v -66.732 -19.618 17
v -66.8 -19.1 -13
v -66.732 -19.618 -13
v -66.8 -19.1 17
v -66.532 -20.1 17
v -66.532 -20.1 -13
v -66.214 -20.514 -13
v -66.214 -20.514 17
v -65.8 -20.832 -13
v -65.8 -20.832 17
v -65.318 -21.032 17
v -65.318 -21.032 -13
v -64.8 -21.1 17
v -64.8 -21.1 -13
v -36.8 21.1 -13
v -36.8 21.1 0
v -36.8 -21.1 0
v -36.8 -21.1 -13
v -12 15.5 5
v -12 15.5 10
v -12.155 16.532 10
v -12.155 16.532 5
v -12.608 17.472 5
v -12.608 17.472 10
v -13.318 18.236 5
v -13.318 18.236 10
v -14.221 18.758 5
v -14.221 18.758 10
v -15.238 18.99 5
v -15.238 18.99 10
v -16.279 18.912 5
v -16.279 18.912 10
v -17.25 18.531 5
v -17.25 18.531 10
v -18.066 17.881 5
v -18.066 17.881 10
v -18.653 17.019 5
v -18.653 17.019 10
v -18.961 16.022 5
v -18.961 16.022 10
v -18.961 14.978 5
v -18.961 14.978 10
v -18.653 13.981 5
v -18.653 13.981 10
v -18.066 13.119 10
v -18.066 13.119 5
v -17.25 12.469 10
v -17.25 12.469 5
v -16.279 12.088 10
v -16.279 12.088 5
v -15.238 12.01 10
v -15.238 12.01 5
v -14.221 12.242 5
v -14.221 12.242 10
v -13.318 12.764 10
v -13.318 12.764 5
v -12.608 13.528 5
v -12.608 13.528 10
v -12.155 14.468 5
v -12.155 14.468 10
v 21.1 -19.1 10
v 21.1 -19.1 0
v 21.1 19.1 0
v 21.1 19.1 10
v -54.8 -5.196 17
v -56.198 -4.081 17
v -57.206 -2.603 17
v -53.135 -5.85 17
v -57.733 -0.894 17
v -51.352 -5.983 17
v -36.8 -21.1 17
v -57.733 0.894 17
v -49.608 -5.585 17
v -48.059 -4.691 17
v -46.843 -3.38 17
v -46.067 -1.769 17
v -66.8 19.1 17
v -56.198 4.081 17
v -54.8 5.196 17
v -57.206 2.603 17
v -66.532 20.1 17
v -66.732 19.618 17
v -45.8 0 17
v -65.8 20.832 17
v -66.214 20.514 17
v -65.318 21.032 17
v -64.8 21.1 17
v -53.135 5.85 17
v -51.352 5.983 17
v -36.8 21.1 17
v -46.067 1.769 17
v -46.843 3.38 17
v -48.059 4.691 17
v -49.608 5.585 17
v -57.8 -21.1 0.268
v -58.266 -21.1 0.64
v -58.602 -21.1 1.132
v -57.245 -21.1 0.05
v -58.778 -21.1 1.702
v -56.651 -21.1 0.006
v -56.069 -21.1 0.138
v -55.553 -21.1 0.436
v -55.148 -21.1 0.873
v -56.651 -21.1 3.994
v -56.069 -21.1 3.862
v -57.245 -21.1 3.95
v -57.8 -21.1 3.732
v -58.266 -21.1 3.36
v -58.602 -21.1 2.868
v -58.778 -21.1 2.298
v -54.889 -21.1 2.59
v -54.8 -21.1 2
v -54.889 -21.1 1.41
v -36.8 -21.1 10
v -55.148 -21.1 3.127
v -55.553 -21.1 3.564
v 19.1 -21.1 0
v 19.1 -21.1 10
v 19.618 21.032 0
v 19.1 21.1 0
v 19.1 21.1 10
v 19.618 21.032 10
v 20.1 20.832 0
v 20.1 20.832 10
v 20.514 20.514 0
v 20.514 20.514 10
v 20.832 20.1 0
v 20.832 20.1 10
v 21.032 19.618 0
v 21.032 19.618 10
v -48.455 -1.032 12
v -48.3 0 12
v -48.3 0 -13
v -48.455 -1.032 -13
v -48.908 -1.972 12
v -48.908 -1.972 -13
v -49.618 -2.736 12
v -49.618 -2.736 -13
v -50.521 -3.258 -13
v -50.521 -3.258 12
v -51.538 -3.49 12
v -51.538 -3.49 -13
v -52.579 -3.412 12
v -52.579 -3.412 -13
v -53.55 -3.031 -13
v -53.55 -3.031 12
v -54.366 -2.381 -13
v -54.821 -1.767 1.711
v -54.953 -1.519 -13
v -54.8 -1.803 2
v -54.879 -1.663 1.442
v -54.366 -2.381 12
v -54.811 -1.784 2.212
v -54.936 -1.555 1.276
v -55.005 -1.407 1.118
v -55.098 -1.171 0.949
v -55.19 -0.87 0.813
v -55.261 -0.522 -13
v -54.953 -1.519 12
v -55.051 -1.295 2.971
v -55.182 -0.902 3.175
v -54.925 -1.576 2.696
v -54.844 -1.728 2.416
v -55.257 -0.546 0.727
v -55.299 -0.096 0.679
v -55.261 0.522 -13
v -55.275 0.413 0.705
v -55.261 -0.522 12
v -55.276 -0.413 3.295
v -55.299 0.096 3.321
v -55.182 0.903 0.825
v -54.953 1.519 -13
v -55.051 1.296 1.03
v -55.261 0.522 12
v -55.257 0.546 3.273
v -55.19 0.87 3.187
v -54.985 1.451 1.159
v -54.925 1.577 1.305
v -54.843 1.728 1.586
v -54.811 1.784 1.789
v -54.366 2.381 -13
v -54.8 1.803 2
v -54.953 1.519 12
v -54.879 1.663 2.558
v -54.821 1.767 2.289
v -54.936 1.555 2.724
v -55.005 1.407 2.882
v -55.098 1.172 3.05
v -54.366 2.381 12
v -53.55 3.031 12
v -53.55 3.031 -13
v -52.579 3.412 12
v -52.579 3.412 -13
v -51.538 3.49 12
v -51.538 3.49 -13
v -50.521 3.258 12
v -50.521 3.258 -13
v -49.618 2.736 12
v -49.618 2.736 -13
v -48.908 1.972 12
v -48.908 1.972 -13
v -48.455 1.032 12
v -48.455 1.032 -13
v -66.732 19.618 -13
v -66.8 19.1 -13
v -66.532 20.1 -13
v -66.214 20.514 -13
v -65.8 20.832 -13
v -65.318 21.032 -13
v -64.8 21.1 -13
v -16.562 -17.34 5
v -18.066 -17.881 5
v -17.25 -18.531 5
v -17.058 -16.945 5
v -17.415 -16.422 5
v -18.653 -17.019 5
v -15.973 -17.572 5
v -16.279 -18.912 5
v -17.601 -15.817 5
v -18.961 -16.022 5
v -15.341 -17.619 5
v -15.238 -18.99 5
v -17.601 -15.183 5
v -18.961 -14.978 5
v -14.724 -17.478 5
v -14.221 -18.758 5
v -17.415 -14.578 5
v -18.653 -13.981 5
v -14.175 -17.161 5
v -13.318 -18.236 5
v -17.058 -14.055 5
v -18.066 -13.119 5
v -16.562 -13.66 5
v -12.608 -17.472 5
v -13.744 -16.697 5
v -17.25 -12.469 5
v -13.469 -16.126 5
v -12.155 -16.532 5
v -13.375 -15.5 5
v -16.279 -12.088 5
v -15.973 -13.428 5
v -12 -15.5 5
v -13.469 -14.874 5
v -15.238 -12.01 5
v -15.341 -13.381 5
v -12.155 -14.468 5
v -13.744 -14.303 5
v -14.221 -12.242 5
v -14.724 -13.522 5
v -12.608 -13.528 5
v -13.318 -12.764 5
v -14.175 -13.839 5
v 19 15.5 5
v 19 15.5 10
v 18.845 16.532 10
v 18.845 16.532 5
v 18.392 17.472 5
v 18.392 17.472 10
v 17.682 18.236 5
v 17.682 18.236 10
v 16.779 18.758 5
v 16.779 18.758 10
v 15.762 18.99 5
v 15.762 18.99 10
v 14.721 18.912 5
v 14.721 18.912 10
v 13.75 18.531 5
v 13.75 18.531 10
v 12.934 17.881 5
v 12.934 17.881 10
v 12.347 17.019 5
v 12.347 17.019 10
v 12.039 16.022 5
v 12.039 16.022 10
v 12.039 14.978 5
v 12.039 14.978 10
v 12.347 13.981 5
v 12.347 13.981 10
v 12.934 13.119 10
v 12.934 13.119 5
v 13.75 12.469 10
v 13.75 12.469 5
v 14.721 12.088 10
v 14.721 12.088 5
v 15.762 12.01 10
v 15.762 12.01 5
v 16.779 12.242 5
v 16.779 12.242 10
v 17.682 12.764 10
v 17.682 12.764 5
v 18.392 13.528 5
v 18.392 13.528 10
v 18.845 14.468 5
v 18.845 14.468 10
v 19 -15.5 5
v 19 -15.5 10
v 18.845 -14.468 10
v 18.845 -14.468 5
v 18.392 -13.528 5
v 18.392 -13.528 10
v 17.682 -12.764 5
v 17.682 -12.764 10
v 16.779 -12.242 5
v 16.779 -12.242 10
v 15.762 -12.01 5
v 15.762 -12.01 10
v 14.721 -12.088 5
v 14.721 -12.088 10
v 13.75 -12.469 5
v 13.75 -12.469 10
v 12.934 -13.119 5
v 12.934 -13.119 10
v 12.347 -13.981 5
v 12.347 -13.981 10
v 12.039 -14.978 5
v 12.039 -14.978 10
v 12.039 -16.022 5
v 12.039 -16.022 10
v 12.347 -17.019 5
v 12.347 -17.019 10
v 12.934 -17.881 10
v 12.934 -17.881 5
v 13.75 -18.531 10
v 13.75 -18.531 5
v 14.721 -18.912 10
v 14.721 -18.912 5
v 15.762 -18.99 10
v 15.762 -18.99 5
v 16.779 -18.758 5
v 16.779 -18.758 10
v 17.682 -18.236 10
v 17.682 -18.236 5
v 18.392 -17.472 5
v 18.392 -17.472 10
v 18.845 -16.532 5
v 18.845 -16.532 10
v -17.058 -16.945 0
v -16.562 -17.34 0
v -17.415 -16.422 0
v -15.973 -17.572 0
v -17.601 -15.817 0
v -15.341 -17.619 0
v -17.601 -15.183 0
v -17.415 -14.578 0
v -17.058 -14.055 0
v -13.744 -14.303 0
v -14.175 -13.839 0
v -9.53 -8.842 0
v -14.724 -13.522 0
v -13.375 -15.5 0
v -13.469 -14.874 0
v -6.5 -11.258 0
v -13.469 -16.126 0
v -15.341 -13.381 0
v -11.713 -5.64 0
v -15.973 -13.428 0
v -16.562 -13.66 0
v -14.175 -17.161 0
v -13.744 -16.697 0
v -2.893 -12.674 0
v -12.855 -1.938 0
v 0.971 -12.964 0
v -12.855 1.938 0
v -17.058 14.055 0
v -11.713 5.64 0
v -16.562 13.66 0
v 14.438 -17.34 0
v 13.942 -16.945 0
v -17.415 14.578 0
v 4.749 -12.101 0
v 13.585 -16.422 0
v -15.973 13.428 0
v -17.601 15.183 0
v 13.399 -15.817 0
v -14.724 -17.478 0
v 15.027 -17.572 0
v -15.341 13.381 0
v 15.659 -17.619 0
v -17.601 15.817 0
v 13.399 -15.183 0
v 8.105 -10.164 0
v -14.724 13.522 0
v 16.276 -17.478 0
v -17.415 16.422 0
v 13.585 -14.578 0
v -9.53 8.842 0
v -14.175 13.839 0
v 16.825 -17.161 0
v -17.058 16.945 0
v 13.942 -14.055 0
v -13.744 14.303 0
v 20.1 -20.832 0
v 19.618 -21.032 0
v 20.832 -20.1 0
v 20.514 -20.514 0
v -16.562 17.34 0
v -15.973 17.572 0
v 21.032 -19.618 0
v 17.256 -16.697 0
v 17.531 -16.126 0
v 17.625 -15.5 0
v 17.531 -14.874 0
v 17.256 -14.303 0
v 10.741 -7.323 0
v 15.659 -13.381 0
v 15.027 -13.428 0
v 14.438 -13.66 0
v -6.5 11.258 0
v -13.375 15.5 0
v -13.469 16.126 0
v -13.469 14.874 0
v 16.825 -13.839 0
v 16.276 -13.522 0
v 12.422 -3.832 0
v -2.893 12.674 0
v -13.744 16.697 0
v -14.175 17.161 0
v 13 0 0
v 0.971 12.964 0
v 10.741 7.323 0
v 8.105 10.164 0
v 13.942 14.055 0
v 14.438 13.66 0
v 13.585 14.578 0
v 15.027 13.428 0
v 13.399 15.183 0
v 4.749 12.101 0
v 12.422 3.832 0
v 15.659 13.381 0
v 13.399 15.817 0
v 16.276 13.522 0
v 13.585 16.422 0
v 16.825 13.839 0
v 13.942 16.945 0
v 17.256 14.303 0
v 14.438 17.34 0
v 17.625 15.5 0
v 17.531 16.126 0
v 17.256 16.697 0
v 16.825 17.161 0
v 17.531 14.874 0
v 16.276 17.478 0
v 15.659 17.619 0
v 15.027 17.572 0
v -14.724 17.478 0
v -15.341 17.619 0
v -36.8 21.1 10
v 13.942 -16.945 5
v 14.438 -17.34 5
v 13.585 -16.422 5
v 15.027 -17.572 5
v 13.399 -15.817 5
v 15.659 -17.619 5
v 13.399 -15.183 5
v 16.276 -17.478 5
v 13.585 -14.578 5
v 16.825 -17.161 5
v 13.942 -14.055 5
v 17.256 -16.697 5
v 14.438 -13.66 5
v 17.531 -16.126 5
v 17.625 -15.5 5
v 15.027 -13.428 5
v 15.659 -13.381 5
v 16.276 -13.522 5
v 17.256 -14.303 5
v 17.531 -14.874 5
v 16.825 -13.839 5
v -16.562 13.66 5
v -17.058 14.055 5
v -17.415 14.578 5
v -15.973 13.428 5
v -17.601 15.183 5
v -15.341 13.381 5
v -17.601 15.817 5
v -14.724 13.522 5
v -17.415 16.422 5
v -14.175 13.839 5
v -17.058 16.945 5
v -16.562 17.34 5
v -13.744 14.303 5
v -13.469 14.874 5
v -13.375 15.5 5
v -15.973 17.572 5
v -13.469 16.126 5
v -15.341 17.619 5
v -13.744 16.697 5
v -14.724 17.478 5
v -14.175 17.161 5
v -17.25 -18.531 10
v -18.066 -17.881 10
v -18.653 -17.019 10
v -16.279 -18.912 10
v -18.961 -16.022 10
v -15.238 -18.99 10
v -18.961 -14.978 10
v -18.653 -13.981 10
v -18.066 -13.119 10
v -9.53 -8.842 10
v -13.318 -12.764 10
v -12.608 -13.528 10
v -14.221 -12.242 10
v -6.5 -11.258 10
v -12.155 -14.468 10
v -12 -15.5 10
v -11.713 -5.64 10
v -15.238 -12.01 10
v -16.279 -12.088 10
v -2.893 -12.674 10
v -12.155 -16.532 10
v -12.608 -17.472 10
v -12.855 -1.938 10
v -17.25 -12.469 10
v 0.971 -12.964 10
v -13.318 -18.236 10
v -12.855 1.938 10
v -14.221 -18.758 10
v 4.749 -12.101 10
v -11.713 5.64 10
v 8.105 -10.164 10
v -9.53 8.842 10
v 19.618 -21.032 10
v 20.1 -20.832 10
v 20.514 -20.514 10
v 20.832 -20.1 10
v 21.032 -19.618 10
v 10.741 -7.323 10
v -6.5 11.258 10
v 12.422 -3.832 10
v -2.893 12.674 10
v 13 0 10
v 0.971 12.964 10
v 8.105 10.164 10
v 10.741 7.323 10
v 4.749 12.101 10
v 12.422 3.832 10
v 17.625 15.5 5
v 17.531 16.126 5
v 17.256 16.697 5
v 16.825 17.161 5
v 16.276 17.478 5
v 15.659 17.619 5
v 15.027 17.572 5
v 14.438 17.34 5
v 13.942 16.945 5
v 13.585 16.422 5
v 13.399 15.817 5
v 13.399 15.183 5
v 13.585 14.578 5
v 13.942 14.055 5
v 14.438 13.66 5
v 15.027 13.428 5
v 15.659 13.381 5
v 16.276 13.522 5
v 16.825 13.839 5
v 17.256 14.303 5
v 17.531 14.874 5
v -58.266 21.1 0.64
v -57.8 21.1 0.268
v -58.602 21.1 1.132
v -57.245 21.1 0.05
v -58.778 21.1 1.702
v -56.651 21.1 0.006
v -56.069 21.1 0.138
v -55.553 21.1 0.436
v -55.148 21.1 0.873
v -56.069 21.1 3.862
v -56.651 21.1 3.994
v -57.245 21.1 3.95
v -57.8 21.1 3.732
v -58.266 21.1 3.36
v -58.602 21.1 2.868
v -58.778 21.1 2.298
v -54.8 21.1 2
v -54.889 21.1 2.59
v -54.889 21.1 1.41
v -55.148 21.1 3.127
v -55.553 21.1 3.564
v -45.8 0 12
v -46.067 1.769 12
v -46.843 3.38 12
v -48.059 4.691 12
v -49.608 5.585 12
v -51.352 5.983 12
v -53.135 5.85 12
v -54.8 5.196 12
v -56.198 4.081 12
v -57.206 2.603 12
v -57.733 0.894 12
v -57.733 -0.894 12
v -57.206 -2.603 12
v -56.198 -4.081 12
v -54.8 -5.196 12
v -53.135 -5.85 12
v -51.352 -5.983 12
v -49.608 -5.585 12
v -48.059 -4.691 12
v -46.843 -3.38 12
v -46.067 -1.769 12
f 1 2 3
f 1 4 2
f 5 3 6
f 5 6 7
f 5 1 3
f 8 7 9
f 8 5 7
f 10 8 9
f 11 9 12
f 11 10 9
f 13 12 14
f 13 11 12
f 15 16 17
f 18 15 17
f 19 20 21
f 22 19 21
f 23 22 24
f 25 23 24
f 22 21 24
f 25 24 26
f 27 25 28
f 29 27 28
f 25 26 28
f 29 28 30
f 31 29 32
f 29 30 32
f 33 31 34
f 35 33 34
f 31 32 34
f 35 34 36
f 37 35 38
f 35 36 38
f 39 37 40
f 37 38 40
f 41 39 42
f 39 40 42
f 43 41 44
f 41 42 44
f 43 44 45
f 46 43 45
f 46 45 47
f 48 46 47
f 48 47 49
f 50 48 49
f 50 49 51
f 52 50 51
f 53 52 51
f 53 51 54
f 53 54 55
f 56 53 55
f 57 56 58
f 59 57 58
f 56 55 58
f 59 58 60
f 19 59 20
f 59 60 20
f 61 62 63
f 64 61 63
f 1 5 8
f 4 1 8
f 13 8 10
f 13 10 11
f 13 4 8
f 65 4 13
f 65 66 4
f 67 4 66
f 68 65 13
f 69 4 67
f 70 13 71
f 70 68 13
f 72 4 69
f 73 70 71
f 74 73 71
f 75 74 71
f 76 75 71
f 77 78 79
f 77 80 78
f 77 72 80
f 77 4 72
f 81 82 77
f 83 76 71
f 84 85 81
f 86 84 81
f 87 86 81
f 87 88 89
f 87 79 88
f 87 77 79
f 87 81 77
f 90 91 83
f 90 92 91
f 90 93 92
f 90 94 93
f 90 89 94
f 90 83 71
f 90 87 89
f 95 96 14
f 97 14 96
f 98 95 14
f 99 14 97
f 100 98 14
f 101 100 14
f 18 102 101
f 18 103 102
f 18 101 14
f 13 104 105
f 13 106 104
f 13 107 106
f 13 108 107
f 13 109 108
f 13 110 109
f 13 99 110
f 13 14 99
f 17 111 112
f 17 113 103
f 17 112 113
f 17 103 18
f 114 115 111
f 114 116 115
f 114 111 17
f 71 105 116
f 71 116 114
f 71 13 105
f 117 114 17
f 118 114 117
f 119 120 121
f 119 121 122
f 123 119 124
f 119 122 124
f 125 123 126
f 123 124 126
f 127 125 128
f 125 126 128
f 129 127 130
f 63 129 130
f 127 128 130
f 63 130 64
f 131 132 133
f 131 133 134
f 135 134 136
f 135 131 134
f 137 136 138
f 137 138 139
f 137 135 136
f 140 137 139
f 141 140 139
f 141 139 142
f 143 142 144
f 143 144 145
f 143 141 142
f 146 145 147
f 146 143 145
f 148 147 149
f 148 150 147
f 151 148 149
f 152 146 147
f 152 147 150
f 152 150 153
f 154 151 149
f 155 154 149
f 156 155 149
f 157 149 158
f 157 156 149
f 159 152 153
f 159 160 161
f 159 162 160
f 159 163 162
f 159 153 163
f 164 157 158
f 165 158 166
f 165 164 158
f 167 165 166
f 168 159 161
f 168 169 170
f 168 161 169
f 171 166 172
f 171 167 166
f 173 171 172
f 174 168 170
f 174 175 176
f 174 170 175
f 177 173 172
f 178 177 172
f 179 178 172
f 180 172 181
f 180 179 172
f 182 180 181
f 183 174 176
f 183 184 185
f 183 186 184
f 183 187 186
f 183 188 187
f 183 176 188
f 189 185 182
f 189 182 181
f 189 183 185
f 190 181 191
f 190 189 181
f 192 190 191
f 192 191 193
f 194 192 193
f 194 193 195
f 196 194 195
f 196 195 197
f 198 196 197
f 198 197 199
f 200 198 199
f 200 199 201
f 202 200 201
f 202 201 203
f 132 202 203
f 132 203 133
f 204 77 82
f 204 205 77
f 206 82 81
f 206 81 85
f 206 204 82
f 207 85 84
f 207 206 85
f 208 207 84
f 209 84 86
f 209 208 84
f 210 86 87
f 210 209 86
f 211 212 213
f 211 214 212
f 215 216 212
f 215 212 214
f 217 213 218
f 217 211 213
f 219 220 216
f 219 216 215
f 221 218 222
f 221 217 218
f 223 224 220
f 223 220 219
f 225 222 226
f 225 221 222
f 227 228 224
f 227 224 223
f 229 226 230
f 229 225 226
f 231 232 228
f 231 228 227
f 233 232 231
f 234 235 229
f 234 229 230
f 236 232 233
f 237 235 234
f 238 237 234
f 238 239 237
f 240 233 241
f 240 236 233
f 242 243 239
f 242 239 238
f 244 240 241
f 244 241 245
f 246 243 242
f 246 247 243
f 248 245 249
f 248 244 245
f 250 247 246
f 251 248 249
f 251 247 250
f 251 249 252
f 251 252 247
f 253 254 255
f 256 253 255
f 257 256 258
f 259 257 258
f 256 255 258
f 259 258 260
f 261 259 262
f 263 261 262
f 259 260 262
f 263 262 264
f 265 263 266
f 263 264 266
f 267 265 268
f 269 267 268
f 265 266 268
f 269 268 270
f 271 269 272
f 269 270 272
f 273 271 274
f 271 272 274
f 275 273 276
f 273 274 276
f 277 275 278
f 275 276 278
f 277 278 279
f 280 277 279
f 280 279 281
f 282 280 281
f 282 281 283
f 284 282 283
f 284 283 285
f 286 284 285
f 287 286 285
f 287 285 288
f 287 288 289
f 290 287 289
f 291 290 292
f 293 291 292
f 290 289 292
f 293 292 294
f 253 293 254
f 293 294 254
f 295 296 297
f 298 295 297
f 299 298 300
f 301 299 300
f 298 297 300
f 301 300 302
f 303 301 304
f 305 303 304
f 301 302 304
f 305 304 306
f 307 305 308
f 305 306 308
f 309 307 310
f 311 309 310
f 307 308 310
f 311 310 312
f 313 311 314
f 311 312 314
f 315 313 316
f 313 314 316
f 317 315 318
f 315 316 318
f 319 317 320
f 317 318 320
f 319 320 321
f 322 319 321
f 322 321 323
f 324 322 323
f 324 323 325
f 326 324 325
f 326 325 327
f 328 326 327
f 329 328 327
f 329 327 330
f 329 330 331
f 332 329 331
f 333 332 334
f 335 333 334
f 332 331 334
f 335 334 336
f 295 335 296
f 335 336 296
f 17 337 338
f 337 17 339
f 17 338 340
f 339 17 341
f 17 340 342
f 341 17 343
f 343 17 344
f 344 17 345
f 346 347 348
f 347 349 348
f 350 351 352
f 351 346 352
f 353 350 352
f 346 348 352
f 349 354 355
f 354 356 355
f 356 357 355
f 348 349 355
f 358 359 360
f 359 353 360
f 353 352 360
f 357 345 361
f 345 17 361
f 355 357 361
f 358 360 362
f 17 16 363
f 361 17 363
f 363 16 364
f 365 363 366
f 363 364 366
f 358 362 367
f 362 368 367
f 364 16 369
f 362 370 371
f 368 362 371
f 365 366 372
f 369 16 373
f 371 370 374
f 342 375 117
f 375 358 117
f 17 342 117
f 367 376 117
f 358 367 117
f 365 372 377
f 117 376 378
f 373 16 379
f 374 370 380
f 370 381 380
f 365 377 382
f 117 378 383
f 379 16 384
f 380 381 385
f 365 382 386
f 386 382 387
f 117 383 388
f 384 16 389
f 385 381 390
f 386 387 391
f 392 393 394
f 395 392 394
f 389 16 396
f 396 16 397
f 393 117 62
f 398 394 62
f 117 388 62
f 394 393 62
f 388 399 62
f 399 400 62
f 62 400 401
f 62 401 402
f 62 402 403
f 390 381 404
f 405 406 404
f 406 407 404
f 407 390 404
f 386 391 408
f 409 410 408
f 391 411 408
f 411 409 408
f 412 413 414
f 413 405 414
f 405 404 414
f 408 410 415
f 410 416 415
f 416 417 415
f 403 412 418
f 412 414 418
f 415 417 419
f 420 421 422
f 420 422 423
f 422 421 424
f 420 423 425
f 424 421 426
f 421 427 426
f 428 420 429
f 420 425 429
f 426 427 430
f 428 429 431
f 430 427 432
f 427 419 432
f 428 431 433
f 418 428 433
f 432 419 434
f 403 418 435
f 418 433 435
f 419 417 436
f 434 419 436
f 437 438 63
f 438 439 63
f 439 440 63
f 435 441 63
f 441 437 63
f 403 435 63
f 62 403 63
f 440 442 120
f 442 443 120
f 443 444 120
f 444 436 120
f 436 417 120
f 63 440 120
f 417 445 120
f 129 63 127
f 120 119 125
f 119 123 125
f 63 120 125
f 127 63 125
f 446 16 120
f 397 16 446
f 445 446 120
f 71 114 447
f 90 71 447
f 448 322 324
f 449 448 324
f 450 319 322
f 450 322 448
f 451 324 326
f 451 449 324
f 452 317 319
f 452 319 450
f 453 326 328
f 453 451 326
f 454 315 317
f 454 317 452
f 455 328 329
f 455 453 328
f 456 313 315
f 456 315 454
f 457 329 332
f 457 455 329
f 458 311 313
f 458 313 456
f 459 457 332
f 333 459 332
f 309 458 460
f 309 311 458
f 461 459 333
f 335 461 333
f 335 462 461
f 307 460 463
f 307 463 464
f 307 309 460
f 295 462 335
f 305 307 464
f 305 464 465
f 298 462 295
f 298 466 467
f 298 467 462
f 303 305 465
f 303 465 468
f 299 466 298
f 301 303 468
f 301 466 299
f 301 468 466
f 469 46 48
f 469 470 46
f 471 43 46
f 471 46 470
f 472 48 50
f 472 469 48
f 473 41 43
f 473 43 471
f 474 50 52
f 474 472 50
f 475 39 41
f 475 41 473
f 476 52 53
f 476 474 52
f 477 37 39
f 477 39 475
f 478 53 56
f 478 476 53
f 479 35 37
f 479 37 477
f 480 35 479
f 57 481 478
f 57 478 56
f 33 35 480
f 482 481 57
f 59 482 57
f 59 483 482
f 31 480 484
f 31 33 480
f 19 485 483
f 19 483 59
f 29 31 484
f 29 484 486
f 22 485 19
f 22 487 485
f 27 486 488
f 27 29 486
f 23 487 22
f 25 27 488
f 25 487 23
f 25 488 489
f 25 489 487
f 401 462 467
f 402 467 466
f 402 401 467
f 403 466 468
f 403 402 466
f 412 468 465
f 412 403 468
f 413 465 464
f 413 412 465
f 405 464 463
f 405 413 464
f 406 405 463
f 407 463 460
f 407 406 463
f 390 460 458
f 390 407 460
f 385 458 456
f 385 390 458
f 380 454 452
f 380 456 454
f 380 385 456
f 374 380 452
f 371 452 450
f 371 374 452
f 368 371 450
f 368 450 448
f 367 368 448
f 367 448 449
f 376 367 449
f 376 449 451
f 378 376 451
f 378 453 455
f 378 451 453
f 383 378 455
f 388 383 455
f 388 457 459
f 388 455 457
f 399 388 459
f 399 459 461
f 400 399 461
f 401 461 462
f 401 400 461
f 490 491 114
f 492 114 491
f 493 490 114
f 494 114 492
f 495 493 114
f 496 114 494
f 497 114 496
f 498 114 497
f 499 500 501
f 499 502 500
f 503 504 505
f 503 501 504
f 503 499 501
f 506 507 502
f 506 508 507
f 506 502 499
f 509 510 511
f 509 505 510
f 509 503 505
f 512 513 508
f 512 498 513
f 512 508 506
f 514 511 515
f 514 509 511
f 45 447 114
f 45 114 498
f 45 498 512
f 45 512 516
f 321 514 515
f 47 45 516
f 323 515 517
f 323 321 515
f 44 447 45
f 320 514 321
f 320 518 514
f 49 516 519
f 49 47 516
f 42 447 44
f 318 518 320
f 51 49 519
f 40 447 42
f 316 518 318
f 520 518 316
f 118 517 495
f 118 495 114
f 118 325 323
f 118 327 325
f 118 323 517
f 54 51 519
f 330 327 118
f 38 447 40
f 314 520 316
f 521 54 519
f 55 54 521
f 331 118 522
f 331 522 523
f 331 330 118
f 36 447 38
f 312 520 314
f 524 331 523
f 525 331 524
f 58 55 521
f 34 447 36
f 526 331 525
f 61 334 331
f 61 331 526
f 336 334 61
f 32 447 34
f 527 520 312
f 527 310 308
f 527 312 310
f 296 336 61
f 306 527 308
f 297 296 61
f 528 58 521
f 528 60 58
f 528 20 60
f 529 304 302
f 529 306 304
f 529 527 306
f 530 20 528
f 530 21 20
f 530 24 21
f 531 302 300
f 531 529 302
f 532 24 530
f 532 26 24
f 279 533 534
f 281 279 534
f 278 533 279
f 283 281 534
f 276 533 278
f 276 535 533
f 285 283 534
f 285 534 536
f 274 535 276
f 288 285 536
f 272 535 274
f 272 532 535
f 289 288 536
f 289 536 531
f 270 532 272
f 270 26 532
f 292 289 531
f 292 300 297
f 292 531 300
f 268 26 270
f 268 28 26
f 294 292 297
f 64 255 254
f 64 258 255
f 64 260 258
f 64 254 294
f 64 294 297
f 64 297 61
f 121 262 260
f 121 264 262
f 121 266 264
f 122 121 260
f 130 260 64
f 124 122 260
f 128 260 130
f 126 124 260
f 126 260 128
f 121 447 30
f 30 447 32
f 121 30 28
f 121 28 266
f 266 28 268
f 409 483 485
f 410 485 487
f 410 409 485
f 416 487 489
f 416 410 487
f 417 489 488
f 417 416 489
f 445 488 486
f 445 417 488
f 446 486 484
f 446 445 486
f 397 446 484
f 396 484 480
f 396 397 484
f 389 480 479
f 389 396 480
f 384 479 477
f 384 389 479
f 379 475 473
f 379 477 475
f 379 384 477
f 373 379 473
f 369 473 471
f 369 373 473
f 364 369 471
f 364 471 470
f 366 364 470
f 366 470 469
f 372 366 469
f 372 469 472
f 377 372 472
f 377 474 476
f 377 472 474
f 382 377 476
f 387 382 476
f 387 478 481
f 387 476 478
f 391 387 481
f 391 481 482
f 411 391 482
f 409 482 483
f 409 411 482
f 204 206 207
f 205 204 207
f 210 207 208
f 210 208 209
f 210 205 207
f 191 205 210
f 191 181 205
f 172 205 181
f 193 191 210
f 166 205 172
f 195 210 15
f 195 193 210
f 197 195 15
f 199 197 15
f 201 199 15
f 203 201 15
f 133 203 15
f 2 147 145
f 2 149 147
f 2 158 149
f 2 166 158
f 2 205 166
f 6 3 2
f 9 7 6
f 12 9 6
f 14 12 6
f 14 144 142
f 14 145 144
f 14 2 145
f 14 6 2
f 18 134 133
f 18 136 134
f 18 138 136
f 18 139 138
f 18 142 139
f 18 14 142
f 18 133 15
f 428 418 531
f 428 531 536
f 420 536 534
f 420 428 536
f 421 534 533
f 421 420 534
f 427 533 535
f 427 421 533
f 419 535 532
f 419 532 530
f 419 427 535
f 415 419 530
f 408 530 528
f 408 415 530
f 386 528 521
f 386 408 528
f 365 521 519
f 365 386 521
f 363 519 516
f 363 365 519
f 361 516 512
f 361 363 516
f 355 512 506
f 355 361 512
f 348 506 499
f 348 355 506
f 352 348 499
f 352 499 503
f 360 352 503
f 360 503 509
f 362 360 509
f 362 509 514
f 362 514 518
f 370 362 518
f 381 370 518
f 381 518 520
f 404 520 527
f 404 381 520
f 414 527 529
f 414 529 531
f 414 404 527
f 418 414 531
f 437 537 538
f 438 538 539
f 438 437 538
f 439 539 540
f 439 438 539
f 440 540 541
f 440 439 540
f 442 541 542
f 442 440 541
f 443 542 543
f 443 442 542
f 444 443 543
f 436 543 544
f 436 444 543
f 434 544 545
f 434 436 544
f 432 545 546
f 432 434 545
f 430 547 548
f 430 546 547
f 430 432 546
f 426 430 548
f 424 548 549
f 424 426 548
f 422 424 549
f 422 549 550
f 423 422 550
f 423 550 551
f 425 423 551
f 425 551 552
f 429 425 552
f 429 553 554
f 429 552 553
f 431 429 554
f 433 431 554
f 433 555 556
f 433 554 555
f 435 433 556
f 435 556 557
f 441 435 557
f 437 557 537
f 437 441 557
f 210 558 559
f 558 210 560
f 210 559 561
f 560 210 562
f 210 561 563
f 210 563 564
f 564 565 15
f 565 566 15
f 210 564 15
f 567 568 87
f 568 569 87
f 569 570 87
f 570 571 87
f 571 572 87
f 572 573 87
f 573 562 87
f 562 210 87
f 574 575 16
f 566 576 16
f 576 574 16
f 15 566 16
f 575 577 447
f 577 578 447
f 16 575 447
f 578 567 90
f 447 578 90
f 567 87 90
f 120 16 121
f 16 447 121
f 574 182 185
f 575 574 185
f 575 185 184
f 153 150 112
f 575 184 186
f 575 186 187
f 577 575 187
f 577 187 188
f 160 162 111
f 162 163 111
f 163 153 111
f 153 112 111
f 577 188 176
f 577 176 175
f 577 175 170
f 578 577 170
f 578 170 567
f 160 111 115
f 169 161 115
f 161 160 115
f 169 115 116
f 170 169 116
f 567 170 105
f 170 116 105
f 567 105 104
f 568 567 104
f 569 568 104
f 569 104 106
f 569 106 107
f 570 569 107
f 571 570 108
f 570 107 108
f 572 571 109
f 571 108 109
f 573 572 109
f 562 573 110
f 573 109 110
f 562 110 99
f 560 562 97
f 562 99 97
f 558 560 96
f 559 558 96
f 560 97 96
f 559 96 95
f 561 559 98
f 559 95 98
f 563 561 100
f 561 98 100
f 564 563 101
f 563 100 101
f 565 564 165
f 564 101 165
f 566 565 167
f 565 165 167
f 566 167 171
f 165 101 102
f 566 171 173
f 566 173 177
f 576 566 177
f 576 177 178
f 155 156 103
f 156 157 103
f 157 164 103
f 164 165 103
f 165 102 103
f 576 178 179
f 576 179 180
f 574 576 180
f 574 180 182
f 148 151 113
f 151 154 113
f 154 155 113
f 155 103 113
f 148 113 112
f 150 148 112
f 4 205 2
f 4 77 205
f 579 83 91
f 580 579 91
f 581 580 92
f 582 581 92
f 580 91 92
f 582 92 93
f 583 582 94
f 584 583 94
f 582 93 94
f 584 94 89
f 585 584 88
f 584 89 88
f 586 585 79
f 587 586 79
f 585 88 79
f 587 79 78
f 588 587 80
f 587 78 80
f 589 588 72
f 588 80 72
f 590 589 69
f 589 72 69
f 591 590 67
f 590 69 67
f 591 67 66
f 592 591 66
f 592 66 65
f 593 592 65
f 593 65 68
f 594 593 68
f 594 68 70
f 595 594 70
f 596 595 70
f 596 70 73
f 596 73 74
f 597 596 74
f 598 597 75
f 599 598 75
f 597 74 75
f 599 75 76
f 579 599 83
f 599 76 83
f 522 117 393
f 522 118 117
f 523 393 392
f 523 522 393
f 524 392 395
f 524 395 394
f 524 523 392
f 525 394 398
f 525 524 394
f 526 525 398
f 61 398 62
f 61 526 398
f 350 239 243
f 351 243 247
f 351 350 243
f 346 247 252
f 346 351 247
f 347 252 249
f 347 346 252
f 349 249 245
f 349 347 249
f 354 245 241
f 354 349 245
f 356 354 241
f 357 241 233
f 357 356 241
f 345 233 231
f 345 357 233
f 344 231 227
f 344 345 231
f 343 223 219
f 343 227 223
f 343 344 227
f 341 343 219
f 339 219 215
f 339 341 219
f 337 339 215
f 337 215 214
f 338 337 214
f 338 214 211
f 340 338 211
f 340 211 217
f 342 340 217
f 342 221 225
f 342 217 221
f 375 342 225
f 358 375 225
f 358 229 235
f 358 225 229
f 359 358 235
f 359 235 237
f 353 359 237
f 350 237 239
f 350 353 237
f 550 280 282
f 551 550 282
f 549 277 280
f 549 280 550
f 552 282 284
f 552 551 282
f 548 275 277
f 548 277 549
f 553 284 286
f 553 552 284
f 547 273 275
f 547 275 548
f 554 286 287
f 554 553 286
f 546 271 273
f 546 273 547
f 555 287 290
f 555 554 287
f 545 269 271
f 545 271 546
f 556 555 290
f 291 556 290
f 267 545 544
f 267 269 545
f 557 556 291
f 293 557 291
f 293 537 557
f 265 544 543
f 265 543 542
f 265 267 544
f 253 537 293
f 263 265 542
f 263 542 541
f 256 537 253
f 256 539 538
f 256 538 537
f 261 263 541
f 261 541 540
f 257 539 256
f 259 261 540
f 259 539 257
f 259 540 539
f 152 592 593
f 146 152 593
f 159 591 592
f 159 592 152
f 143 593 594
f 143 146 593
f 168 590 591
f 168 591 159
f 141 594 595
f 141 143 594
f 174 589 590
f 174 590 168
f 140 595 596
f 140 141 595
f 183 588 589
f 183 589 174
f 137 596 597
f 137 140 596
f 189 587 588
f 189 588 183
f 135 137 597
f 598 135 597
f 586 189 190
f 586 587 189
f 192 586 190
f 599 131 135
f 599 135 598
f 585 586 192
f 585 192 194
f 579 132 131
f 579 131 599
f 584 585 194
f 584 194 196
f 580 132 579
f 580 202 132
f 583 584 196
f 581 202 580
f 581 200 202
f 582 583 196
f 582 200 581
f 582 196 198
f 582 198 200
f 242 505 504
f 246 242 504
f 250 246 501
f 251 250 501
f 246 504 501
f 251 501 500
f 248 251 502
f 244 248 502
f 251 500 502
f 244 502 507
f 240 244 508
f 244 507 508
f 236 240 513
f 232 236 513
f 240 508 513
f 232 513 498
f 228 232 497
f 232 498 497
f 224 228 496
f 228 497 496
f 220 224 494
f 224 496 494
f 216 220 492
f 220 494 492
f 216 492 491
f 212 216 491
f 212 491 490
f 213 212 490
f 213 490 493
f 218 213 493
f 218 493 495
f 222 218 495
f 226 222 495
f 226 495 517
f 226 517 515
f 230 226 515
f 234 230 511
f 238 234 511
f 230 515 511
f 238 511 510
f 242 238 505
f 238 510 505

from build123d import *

# Parameters (mm, degrees)
F0_R      = 2.125
F0_R_2    = 3.5
F0_R_3    = 13
F1_DEPTH  = 10
F2_W      = 30
F2_H      = 42.2
F2_R      = 3.5
F3_DEPTH  = 7
F4_R      = 3.5
F5_DEPTH  = 5
F6_R      = 6
F7_DEPTH  = 5
F8_W      = 30
F8_H      = 42.2
F8_R      = 3.5
F9_DEPTH  = 13
F10_R     = 2
F11_DEPTH = 42.201
F12_R     = 2


with BuildPart() as f1:
    # F0 (on Top) → F1 (new body)
    with BuildSketch(Plane.XY):
        Polygon((21.1, 21.1), (0, 21.1), (-21.1, 21.1), (-66.8, 21.1), (-66.8, 0), (-66.8, -21.1), (-21.1, -21.1), (0, -21.1), (21.1, -21.1), (21.1, 0), align=None)
        with Locations((-15.5, -15.5)):
            Circle(F0_R, mode=Mode.SUBTRACT)
        with Locations((15.5, -15.5)):
            Circle(F0_R, mode=Mode.SUBTRACT)
        with Locations((-51.8, 0)):
            Circle(F0_R_2, mode=Mode.SUBTRACT)
        Circle(F0_R_3, mode=Mode.SUBTRACT)
        with Locations((-15.5, 15.5)):
            Circle(F0_R, mode=Mode.SUBTRACT)
        with Locations((15.5, 15.5)):
            Circle(F0_R, mode=Mode.SUBTRACT)
    extrude(amount=F1_DEPTH)

    # F2 (on face) → F3 (join)
    with BuildSketch(Plane.XY.offset(10)):
        with Locations((-51.8, 0)):
            Rectangle(F2_W, F2_H)
        with Locations((-51.8, 0)):
            Circle(F2_R, mode=Mode.SUBTRACT)
    extrude(amount=F3_DEPTH)

    # F4 (on face) → F5 (cut)
    with BuildSketch(Plane.XY.offset(10)):
        with Locations((-15.5, 15.5)):
            Circle(F4_R)
        with Locations((15.5, 15.5)):
            Circle(F4_R)
        with Locations((15.5, -15.5)):
            Circle(F4_R)
        with Locations((-15.5, -15.5)):
            Circle(F4_R)
    extrude(amount=-F5_DEPTH, mode=Mode.SUBTRACT)

    # F6 (on face) → F7 (cut)
    with BuildSketch(Plane.XY.offset(17)):
        with Locations((-51.8, 0)):
            Circle(F6_R)
    extrude(amount=-F7_DEPTH, mode=Mode.SUBTRACT)

    # F8 (on face) → F9 (join)
    with BuildSketch(Plane(origin=(0, 0, 0), x_dir=(1, 0, 0), z_dir=(0, 0, -1))):
        with Locations((-51.8, 0)):
            Rectangle(F8_W, F8_H)
        with Locations((-51.8, 0)):
            Circle(F8_R, mode=Mode.SUBTRACT)
    extrude(amount=F9_DEPTH)

    # F10 (on face) → F11 (cut, through all)
    with BuildSketch(Plane.XZ.offset(21.1)):
        with Locations((-56.8, 2)):
            Circle(F10_R)
    extrude(amount=-F11_DEPTH, mode=Mode.SUBTRACT)

    # F12
    f12_edges = [f1.edges().sort_by_distance(p)[0] for p in [
        (21.1, 21.1, 5),
        (21.1, -21.1, 5),
        (-66.8, -21.1, 2),
        (-66.8, 21.1, 2),
    ]]
    fillet(f12_edges, radius=F12_R)


solid = f1.part
